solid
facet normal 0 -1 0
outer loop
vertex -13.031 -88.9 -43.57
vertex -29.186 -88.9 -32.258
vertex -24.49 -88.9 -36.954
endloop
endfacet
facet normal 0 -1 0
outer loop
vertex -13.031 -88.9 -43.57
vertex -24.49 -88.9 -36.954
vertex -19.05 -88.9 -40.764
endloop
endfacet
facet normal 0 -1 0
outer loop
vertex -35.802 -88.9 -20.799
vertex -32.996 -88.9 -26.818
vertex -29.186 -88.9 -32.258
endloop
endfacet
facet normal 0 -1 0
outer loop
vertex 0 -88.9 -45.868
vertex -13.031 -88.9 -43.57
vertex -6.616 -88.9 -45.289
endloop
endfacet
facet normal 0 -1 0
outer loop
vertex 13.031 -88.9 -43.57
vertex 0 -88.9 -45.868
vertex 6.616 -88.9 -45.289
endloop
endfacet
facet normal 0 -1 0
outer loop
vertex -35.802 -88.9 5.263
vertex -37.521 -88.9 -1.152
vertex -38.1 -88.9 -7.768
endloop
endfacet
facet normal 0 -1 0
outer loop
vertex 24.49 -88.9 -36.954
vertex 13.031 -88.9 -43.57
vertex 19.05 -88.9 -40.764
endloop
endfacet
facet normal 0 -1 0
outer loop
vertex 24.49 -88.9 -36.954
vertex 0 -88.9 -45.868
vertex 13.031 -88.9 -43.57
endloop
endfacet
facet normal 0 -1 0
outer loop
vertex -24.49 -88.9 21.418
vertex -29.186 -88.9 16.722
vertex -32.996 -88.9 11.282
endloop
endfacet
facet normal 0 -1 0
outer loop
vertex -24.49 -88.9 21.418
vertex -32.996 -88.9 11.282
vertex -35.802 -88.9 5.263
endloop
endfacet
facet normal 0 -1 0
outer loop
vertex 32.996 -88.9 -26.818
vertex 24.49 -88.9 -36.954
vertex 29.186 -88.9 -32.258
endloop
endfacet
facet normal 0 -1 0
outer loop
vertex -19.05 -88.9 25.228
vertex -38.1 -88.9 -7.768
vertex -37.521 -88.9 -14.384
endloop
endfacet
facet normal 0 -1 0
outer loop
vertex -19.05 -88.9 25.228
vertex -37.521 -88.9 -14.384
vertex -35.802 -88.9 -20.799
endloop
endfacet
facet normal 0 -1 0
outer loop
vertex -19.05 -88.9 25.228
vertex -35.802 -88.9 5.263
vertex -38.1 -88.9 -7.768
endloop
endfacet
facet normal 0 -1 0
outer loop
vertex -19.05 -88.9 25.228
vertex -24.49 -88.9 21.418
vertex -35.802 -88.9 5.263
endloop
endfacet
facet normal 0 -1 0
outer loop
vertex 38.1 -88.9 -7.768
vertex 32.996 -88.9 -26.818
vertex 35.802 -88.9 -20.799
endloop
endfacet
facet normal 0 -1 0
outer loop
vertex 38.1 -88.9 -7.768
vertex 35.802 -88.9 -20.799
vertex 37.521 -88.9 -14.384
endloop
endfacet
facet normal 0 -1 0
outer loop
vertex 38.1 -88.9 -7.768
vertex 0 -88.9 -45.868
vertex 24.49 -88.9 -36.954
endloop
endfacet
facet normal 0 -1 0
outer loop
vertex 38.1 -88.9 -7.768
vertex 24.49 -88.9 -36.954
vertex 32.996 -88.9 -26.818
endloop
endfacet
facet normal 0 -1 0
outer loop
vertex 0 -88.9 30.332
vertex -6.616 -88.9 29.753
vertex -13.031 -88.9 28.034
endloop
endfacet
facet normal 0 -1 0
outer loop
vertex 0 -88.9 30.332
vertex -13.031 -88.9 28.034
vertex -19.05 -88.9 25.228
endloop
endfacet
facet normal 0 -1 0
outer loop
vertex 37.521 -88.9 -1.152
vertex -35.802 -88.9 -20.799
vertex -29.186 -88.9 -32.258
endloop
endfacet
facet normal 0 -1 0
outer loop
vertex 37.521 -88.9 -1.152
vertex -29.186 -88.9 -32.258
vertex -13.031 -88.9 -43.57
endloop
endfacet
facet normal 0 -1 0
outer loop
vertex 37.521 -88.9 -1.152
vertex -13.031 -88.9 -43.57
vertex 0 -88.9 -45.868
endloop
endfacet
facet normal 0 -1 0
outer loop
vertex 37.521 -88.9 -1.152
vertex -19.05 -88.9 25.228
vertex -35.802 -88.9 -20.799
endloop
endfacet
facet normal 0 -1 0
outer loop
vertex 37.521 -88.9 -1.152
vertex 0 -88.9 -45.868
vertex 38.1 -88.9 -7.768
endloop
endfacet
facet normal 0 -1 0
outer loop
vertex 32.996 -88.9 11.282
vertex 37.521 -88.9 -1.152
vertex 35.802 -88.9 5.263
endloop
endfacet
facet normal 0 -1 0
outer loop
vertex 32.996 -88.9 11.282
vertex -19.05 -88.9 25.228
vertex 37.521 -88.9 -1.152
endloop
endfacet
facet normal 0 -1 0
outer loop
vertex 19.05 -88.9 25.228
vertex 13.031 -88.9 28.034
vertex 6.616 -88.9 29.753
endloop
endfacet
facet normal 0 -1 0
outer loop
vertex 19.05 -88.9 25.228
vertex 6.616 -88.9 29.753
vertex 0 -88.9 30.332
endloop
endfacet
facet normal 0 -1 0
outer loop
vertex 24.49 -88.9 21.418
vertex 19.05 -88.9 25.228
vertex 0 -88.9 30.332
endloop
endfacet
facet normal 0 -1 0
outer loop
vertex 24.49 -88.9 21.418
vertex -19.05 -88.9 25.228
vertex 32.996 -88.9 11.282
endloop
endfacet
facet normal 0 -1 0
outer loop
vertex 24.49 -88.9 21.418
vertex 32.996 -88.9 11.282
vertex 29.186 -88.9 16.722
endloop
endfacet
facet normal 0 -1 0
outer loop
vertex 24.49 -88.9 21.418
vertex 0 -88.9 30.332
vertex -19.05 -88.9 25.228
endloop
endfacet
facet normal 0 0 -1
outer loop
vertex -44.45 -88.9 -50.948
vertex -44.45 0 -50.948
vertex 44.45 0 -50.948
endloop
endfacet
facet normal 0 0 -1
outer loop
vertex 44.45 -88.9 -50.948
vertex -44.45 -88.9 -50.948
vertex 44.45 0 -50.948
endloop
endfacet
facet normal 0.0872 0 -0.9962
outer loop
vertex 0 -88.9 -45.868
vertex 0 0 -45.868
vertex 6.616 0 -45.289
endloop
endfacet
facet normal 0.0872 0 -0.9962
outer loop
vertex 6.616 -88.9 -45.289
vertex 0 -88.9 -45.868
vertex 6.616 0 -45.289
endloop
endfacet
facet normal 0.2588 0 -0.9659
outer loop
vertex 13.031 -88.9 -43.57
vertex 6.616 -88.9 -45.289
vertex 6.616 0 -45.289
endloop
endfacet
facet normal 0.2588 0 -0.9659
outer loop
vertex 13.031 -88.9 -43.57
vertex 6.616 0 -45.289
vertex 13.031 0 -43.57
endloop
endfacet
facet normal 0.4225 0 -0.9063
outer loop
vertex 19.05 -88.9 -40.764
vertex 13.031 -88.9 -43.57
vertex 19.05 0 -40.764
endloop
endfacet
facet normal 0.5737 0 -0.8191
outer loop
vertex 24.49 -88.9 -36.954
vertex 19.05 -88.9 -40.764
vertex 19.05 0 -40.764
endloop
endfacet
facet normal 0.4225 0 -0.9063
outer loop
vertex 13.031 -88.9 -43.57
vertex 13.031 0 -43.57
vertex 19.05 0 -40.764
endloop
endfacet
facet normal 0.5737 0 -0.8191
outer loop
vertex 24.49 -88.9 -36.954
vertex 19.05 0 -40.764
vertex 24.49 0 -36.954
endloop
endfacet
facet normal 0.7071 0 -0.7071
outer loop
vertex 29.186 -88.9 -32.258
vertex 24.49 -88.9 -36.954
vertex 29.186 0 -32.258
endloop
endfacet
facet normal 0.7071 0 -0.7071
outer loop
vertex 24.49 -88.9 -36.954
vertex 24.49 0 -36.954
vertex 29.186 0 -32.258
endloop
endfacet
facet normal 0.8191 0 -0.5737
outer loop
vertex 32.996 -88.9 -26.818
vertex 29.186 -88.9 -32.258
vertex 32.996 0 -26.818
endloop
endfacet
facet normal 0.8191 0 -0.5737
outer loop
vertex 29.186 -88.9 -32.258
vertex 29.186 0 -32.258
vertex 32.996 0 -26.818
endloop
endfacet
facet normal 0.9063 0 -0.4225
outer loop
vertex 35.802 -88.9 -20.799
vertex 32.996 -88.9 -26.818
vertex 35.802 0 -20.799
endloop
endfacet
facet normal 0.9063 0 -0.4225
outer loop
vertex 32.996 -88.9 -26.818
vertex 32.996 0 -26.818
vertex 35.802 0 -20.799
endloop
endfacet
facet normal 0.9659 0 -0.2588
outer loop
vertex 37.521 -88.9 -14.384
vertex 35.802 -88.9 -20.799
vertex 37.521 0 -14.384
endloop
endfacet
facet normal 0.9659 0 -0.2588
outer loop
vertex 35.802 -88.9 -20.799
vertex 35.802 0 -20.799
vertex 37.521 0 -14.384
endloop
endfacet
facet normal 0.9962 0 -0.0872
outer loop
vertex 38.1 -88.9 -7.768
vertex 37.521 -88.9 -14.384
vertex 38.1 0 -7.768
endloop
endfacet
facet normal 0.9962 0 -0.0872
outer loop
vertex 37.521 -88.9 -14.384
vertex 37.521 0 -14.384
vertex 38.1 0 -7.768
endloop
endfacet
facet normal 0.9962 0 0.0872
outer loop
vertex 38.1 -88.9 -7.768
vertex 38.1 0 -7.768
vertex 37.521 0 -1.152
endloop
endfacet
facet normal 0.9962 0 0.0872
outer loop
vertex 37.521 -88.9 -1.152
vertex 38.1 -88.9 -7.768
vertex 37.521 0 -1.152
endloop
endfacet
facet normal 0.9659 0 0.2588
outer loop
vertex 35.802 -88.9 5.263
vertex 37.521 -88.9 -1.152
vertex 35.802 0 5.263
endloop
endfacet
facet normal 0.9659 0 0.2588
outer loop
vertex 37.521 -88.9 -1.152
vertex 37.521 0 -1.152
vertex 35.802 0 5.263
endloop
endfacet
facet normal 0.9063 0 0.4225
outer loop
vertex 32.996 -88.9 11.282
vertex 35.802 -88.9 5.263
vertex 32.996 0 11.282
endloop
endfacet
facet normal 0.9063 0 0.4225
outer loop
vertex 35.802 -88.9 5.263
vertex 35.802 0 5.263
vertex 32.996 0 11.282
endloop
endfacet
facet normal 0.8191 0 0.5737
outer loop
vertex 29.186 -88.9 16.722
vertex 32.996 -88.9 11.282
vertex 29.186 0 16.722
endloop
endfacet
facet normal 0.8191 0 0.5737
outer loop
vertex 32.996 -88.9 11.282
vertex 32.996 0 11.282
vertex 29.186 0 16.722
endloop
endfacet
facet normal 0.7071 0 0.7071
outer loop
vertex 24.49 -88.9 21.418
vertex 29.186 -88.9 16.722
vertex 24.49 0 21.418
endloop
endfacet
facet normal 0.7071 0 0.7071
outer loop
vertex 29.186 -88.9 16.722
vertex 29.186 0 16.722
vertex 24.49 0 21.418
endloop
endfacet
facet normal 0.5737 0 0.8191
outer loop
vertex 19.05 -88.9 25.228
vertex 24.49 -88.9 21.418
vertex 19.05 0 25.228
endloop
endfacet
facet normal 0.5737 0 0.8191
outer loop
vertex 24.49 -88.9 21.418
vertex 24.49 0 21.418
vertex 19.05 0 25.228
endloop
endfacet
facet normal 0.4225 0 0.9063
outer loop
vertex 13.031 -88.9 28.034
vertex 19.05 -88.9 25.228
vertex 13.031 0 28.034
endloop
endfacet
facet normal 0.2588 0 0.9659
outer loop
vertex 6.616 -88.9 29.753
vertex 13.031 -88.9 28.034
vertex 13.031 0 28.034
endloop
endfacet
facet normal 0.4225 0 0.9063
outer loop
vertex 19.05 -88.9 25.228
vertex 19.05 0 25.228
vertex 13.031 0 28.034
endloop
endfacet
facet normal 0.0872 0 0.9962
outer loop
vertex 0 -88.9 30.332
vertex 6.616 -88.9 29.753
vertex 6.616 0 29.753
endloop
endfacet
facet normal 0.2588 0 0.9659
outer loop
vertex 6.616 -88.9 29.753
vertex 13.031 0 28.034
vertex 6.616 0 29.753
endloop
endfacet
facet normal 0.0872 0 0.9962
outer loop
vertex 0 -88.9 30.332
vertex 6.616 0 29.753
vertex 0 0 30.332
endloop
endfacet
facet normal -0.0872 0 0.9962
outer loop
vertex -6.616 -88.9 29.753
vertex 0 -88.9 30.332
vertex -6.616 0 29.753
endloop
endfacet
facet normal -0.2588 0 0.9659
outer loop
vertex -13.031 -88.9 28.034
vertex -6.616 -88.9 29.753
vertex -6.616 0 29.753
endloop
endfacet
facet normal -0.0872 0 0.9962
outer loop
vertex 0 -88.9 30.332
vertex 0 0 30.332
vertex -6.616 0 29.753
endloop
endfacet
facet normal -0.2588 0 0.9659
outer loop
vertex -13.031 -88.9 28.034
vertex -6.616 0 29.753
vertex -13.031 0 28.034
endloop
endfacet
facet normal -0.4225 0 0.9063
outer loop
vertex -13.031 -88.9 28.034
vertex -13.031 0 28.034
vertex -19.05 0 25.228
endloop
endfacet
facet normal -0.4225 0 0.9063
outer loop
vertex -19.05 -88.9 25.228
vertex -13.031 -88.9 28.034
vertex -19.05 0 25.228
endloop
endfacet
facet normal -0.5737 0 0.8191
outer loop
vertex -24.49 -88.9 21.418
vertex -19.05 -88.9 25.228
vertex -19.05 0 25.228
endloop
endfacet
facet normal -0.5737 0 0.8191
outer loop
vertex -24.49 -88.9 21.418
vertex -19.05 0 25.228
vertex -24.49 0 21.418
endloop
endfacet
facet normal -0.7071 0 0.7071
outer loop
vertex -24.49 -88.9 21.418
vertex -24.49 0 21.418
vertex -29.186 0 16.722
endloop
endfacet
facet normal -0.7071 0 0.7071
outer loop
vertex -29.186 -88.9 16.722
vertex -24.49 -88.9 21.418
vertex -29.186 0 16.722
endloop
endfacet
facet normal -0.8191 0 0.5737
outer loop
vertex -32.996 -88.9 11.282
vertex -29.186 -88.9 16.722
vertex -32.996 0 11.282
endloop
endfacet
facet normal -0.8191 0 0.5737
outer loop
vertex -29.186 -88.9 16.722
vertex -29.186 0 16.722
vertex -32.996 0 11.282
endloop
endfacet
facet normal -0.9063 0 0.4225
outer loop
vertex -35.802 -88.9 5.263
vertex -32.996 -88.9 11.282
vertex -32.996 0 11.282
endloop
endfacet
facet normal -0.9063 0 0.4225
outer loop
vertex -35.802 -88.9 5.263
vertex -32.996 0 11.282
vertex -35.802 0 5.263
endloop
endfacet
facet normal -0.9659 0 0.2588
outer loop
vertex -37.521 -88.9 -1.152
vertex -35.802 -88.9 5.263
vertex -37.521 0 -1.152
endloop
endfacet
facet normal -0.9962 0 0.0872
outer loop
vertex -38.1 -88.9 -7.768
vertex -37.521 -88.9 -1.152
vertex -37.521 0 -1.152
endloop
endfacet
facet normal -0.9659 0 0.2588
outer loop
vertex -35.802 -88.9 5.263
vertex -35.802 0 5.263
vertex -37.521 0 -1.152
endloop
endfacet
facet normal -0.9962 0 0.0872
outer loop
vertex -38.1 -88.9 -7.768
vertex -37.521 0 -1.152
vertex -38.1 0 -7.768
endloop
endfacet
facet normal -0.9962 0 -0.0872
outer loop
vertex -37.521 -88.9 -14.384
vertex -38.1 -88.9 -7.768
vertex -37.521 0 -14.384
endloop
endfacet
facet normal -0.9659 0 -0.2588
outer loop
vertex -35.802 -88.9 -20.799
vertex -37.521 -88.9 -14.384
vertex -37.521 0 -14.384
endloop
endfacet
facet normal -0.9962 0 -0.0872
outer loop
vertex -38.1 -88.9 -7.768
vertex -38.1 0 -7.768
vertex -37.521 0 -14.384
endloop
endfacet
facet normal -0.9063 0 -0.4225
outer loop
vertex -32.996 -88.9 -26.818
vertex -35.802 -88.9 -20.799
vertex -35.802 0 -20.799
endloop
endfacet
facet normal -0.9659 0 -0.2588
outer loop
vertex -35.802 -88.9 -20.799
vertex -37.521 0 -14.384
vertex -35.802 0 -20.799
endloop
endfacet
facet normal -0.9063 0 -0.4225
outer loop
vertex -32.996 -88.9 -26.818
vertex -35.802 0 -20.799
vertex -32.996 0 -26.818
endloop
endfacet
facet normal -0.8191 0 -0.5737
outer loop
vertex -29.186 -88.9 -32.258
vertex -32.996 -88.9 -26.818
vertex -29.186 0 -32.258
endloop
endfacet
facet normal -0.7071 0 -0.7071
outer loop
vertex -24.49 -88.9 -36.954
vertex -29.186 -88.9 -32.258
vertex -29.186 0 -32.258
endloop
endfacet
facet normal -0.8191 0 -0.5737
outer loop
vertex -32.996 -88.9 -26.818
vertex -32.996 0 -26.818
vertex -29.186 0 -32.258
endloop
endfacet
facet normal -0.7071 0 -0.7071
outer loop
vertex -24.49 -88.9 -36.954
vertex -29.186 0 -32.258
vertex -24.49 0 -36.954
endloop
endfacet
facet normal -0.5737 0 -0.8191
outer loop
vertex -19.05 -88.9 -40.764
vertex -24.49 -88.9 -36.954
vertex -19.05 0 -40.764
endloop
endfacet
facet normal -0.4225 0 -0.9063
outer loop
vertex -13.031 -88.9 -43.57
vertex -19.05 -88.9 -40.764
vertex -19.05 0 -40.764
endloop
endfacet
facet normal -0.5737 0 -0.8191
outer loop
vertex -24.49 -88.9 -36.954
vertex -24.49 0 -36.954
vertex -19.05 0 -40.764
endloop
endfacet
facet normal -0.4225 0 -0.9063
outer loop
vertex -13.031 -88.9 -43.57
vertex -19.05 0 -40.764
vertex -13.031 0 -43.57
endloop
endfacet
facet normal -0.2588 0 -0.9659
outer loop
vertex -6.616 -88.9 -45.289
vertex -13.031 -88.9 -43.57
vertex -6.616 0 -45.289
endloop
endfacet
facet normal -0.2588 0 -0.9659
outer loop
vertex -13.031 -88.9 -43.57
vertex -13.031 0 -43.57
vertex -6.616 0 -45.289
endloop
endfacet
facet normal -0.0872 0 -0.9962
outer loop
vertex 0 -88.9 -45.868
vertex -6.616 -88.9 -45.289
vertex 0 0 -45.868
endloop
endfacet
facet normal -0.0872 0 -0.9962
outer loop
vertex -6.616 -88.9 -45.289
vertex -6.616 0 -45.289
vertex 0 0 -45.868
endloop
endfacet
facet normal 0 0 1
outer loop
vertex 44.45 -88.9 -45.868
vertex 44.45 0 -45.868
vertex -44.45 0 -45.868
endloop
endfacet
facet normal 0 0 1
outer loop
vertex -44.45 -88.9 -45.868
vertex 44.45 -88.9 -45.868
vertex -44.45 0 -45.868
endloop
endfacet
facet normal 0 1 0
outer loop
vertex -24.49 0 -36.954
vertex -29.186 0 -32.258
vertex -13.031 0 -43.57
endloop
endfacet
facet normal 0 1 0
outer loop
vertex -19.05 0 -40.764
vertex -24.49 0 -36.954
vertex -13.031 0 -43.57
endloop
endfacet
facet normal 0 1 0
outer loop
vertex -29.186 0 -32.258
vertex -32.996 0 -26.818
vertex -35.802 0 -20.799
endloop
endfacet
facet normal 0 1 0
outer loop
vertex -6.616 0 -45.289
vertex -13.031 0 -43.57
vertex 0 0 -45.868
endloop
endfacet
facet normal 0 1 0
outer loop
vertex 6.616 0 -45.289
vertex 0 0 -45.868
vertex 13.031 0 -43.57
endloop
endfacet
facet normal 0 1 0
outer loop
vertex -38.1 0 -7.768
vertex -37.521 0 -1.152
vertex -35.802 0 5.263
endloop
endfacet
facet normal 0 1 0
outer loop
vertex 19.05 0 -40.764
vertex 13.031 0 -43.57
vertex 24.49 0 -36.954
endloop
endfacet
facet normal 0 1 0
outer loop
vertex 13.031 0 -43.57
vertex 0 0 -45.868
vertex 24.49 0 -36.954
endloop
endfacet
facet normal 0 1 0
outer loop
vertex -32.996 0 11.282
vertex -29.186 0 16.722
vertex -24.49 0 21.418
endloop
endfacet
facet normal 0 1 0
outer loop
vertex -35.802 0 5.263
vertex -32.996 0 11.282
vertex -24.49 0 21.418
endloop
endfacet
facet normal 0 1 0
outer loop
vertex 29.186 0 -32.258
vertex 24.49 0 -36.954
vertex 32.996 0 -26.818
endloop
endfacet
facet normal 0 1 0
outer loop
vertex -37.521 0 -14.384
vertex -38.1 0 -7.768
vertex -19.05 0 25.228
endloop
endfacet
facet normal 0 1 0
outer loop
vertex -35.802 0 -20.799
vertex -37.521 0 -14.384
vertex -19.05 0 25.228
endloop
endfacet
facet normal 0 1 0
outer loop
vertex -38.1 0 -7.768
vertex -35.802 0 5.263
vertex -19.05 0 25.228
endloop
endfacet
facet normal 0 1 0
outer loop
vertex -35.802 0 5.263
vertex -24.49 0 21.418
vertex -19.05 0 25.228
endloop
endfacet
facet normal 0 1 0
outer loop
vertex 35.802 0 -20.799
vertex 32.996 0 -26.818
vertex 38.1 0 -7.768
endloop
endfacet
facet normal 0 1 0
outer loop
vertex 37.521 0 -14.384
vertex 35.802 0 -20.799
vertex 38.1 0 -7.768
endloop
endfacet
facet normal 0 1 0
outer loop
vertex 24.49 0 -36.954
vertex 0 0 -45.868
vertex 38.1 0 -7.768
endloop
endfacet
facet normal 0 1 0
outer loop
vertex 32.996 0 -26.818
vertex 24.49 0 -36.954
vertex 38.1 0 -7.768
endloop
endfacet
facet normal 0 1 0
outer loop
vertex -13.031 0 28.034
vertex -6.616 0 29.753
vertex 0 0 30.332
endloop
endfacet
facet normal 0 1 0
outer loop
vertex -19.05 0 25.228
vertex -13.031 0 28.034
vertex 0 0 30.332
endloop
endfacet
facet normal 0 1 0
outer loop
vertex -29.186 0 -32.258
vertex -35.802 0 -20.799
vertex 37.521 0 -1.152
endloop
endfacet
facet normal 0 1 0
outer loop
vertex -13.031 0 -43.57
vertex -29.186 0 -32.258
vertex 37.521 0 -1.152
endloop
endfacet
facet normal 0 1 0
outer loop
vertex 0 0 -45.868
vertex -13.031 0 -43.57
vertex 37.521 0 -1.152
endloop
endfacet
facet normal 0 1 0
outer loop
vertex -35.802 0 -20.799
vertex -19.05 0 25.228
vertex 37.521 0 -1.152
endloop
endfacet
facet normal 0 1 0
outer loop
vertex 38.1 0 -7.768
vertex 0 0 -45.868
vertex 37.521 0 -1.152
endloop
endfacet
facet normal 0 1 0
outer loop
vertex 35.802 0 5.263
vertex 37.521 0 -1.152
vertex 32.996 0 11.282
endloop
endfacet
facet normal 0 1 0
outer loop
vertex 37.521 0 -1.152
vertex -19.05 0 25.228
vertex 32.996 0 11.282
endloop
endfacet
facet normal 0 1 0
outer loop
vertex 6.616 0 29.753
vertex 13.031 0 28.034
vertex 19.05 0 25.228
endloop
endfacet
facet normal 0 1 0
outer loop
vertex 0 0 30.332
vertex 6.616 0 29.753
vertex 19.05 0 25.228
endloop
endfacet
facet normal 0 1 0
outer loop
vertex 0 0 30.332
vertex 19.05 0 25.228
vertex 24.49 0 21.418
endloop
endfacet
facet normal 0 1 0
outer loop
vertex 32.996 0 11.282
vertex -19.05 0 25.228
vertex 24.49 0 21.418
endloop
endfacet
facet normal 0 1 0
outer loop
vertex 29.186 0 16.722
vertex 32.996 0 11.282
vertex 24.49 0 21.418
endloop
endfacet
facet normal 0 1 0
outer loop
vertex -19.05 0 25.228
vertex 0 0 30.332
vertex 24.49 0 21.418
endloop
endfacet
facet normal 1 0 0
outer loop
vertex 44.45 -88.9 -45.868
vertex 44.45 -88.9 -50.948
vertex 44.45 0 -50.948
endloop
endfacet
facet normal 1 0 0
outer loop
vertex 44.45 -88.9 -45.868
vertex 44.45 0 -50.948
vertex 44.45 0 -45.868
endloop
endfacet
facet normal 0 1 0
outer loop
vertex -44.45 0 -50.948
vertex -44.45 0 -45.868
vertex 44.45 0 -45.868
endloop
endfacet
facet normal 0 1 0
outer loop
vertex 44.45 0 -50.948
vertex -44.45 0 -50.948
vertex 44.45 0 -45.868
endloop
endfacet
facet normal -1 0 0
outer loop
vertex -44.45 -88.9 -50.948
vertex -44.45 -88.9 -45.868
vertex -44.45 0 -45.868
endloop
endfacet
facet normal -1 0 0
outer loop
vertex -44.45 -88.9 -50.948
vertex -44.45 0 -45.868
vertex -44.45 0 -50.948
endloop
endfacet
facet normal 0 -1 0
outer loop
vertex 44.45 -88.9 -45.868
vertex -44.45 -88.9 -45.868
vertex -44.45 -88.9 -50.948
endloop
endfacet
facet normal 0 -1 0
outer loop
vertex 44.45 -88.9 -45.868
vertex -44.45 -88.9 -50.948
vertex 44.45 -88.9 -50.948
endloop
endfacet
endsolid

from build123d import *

# Parameters (mm, degrees)
F1_DEPTH = 88.9


# Not quite as in the source:
# - a feature names something its author has since deleted; it is built from what else it names


with BuildPart() as f1:
    # F0 (on Front) → F1 (new body)
    with BuildSketch(Plane.XZ):
        with BuildLine():
            ThreePointArc((-1.019e-07, -45.8680424225), (26.9407683272, -34.7088108218), (38.1, -7.7680424225))
            ThreePointArc((38.1, -7.7680424225), (-26.9407683272, 19.1727259767), (-1.019e-07, -45.8680424225))
        make_face()
    extrude(amount=F1_DEPTH)


with BuildPart() as f1b:
    # F0 (on Front) → F1, piece 2 (new body)
    with BuildSketch(Plane.XZ):
        Polygon((44.45, -45.8680424225), (-1.019e-07, -45.8680424225), (-44.45, -45.8680424225), (-44.45, -50.9480424225), (44.45, -50.9480424225), align=None)
    extrude(amount=F1_DEPTH)


solid = Compound([f1.part, f1b.part])
